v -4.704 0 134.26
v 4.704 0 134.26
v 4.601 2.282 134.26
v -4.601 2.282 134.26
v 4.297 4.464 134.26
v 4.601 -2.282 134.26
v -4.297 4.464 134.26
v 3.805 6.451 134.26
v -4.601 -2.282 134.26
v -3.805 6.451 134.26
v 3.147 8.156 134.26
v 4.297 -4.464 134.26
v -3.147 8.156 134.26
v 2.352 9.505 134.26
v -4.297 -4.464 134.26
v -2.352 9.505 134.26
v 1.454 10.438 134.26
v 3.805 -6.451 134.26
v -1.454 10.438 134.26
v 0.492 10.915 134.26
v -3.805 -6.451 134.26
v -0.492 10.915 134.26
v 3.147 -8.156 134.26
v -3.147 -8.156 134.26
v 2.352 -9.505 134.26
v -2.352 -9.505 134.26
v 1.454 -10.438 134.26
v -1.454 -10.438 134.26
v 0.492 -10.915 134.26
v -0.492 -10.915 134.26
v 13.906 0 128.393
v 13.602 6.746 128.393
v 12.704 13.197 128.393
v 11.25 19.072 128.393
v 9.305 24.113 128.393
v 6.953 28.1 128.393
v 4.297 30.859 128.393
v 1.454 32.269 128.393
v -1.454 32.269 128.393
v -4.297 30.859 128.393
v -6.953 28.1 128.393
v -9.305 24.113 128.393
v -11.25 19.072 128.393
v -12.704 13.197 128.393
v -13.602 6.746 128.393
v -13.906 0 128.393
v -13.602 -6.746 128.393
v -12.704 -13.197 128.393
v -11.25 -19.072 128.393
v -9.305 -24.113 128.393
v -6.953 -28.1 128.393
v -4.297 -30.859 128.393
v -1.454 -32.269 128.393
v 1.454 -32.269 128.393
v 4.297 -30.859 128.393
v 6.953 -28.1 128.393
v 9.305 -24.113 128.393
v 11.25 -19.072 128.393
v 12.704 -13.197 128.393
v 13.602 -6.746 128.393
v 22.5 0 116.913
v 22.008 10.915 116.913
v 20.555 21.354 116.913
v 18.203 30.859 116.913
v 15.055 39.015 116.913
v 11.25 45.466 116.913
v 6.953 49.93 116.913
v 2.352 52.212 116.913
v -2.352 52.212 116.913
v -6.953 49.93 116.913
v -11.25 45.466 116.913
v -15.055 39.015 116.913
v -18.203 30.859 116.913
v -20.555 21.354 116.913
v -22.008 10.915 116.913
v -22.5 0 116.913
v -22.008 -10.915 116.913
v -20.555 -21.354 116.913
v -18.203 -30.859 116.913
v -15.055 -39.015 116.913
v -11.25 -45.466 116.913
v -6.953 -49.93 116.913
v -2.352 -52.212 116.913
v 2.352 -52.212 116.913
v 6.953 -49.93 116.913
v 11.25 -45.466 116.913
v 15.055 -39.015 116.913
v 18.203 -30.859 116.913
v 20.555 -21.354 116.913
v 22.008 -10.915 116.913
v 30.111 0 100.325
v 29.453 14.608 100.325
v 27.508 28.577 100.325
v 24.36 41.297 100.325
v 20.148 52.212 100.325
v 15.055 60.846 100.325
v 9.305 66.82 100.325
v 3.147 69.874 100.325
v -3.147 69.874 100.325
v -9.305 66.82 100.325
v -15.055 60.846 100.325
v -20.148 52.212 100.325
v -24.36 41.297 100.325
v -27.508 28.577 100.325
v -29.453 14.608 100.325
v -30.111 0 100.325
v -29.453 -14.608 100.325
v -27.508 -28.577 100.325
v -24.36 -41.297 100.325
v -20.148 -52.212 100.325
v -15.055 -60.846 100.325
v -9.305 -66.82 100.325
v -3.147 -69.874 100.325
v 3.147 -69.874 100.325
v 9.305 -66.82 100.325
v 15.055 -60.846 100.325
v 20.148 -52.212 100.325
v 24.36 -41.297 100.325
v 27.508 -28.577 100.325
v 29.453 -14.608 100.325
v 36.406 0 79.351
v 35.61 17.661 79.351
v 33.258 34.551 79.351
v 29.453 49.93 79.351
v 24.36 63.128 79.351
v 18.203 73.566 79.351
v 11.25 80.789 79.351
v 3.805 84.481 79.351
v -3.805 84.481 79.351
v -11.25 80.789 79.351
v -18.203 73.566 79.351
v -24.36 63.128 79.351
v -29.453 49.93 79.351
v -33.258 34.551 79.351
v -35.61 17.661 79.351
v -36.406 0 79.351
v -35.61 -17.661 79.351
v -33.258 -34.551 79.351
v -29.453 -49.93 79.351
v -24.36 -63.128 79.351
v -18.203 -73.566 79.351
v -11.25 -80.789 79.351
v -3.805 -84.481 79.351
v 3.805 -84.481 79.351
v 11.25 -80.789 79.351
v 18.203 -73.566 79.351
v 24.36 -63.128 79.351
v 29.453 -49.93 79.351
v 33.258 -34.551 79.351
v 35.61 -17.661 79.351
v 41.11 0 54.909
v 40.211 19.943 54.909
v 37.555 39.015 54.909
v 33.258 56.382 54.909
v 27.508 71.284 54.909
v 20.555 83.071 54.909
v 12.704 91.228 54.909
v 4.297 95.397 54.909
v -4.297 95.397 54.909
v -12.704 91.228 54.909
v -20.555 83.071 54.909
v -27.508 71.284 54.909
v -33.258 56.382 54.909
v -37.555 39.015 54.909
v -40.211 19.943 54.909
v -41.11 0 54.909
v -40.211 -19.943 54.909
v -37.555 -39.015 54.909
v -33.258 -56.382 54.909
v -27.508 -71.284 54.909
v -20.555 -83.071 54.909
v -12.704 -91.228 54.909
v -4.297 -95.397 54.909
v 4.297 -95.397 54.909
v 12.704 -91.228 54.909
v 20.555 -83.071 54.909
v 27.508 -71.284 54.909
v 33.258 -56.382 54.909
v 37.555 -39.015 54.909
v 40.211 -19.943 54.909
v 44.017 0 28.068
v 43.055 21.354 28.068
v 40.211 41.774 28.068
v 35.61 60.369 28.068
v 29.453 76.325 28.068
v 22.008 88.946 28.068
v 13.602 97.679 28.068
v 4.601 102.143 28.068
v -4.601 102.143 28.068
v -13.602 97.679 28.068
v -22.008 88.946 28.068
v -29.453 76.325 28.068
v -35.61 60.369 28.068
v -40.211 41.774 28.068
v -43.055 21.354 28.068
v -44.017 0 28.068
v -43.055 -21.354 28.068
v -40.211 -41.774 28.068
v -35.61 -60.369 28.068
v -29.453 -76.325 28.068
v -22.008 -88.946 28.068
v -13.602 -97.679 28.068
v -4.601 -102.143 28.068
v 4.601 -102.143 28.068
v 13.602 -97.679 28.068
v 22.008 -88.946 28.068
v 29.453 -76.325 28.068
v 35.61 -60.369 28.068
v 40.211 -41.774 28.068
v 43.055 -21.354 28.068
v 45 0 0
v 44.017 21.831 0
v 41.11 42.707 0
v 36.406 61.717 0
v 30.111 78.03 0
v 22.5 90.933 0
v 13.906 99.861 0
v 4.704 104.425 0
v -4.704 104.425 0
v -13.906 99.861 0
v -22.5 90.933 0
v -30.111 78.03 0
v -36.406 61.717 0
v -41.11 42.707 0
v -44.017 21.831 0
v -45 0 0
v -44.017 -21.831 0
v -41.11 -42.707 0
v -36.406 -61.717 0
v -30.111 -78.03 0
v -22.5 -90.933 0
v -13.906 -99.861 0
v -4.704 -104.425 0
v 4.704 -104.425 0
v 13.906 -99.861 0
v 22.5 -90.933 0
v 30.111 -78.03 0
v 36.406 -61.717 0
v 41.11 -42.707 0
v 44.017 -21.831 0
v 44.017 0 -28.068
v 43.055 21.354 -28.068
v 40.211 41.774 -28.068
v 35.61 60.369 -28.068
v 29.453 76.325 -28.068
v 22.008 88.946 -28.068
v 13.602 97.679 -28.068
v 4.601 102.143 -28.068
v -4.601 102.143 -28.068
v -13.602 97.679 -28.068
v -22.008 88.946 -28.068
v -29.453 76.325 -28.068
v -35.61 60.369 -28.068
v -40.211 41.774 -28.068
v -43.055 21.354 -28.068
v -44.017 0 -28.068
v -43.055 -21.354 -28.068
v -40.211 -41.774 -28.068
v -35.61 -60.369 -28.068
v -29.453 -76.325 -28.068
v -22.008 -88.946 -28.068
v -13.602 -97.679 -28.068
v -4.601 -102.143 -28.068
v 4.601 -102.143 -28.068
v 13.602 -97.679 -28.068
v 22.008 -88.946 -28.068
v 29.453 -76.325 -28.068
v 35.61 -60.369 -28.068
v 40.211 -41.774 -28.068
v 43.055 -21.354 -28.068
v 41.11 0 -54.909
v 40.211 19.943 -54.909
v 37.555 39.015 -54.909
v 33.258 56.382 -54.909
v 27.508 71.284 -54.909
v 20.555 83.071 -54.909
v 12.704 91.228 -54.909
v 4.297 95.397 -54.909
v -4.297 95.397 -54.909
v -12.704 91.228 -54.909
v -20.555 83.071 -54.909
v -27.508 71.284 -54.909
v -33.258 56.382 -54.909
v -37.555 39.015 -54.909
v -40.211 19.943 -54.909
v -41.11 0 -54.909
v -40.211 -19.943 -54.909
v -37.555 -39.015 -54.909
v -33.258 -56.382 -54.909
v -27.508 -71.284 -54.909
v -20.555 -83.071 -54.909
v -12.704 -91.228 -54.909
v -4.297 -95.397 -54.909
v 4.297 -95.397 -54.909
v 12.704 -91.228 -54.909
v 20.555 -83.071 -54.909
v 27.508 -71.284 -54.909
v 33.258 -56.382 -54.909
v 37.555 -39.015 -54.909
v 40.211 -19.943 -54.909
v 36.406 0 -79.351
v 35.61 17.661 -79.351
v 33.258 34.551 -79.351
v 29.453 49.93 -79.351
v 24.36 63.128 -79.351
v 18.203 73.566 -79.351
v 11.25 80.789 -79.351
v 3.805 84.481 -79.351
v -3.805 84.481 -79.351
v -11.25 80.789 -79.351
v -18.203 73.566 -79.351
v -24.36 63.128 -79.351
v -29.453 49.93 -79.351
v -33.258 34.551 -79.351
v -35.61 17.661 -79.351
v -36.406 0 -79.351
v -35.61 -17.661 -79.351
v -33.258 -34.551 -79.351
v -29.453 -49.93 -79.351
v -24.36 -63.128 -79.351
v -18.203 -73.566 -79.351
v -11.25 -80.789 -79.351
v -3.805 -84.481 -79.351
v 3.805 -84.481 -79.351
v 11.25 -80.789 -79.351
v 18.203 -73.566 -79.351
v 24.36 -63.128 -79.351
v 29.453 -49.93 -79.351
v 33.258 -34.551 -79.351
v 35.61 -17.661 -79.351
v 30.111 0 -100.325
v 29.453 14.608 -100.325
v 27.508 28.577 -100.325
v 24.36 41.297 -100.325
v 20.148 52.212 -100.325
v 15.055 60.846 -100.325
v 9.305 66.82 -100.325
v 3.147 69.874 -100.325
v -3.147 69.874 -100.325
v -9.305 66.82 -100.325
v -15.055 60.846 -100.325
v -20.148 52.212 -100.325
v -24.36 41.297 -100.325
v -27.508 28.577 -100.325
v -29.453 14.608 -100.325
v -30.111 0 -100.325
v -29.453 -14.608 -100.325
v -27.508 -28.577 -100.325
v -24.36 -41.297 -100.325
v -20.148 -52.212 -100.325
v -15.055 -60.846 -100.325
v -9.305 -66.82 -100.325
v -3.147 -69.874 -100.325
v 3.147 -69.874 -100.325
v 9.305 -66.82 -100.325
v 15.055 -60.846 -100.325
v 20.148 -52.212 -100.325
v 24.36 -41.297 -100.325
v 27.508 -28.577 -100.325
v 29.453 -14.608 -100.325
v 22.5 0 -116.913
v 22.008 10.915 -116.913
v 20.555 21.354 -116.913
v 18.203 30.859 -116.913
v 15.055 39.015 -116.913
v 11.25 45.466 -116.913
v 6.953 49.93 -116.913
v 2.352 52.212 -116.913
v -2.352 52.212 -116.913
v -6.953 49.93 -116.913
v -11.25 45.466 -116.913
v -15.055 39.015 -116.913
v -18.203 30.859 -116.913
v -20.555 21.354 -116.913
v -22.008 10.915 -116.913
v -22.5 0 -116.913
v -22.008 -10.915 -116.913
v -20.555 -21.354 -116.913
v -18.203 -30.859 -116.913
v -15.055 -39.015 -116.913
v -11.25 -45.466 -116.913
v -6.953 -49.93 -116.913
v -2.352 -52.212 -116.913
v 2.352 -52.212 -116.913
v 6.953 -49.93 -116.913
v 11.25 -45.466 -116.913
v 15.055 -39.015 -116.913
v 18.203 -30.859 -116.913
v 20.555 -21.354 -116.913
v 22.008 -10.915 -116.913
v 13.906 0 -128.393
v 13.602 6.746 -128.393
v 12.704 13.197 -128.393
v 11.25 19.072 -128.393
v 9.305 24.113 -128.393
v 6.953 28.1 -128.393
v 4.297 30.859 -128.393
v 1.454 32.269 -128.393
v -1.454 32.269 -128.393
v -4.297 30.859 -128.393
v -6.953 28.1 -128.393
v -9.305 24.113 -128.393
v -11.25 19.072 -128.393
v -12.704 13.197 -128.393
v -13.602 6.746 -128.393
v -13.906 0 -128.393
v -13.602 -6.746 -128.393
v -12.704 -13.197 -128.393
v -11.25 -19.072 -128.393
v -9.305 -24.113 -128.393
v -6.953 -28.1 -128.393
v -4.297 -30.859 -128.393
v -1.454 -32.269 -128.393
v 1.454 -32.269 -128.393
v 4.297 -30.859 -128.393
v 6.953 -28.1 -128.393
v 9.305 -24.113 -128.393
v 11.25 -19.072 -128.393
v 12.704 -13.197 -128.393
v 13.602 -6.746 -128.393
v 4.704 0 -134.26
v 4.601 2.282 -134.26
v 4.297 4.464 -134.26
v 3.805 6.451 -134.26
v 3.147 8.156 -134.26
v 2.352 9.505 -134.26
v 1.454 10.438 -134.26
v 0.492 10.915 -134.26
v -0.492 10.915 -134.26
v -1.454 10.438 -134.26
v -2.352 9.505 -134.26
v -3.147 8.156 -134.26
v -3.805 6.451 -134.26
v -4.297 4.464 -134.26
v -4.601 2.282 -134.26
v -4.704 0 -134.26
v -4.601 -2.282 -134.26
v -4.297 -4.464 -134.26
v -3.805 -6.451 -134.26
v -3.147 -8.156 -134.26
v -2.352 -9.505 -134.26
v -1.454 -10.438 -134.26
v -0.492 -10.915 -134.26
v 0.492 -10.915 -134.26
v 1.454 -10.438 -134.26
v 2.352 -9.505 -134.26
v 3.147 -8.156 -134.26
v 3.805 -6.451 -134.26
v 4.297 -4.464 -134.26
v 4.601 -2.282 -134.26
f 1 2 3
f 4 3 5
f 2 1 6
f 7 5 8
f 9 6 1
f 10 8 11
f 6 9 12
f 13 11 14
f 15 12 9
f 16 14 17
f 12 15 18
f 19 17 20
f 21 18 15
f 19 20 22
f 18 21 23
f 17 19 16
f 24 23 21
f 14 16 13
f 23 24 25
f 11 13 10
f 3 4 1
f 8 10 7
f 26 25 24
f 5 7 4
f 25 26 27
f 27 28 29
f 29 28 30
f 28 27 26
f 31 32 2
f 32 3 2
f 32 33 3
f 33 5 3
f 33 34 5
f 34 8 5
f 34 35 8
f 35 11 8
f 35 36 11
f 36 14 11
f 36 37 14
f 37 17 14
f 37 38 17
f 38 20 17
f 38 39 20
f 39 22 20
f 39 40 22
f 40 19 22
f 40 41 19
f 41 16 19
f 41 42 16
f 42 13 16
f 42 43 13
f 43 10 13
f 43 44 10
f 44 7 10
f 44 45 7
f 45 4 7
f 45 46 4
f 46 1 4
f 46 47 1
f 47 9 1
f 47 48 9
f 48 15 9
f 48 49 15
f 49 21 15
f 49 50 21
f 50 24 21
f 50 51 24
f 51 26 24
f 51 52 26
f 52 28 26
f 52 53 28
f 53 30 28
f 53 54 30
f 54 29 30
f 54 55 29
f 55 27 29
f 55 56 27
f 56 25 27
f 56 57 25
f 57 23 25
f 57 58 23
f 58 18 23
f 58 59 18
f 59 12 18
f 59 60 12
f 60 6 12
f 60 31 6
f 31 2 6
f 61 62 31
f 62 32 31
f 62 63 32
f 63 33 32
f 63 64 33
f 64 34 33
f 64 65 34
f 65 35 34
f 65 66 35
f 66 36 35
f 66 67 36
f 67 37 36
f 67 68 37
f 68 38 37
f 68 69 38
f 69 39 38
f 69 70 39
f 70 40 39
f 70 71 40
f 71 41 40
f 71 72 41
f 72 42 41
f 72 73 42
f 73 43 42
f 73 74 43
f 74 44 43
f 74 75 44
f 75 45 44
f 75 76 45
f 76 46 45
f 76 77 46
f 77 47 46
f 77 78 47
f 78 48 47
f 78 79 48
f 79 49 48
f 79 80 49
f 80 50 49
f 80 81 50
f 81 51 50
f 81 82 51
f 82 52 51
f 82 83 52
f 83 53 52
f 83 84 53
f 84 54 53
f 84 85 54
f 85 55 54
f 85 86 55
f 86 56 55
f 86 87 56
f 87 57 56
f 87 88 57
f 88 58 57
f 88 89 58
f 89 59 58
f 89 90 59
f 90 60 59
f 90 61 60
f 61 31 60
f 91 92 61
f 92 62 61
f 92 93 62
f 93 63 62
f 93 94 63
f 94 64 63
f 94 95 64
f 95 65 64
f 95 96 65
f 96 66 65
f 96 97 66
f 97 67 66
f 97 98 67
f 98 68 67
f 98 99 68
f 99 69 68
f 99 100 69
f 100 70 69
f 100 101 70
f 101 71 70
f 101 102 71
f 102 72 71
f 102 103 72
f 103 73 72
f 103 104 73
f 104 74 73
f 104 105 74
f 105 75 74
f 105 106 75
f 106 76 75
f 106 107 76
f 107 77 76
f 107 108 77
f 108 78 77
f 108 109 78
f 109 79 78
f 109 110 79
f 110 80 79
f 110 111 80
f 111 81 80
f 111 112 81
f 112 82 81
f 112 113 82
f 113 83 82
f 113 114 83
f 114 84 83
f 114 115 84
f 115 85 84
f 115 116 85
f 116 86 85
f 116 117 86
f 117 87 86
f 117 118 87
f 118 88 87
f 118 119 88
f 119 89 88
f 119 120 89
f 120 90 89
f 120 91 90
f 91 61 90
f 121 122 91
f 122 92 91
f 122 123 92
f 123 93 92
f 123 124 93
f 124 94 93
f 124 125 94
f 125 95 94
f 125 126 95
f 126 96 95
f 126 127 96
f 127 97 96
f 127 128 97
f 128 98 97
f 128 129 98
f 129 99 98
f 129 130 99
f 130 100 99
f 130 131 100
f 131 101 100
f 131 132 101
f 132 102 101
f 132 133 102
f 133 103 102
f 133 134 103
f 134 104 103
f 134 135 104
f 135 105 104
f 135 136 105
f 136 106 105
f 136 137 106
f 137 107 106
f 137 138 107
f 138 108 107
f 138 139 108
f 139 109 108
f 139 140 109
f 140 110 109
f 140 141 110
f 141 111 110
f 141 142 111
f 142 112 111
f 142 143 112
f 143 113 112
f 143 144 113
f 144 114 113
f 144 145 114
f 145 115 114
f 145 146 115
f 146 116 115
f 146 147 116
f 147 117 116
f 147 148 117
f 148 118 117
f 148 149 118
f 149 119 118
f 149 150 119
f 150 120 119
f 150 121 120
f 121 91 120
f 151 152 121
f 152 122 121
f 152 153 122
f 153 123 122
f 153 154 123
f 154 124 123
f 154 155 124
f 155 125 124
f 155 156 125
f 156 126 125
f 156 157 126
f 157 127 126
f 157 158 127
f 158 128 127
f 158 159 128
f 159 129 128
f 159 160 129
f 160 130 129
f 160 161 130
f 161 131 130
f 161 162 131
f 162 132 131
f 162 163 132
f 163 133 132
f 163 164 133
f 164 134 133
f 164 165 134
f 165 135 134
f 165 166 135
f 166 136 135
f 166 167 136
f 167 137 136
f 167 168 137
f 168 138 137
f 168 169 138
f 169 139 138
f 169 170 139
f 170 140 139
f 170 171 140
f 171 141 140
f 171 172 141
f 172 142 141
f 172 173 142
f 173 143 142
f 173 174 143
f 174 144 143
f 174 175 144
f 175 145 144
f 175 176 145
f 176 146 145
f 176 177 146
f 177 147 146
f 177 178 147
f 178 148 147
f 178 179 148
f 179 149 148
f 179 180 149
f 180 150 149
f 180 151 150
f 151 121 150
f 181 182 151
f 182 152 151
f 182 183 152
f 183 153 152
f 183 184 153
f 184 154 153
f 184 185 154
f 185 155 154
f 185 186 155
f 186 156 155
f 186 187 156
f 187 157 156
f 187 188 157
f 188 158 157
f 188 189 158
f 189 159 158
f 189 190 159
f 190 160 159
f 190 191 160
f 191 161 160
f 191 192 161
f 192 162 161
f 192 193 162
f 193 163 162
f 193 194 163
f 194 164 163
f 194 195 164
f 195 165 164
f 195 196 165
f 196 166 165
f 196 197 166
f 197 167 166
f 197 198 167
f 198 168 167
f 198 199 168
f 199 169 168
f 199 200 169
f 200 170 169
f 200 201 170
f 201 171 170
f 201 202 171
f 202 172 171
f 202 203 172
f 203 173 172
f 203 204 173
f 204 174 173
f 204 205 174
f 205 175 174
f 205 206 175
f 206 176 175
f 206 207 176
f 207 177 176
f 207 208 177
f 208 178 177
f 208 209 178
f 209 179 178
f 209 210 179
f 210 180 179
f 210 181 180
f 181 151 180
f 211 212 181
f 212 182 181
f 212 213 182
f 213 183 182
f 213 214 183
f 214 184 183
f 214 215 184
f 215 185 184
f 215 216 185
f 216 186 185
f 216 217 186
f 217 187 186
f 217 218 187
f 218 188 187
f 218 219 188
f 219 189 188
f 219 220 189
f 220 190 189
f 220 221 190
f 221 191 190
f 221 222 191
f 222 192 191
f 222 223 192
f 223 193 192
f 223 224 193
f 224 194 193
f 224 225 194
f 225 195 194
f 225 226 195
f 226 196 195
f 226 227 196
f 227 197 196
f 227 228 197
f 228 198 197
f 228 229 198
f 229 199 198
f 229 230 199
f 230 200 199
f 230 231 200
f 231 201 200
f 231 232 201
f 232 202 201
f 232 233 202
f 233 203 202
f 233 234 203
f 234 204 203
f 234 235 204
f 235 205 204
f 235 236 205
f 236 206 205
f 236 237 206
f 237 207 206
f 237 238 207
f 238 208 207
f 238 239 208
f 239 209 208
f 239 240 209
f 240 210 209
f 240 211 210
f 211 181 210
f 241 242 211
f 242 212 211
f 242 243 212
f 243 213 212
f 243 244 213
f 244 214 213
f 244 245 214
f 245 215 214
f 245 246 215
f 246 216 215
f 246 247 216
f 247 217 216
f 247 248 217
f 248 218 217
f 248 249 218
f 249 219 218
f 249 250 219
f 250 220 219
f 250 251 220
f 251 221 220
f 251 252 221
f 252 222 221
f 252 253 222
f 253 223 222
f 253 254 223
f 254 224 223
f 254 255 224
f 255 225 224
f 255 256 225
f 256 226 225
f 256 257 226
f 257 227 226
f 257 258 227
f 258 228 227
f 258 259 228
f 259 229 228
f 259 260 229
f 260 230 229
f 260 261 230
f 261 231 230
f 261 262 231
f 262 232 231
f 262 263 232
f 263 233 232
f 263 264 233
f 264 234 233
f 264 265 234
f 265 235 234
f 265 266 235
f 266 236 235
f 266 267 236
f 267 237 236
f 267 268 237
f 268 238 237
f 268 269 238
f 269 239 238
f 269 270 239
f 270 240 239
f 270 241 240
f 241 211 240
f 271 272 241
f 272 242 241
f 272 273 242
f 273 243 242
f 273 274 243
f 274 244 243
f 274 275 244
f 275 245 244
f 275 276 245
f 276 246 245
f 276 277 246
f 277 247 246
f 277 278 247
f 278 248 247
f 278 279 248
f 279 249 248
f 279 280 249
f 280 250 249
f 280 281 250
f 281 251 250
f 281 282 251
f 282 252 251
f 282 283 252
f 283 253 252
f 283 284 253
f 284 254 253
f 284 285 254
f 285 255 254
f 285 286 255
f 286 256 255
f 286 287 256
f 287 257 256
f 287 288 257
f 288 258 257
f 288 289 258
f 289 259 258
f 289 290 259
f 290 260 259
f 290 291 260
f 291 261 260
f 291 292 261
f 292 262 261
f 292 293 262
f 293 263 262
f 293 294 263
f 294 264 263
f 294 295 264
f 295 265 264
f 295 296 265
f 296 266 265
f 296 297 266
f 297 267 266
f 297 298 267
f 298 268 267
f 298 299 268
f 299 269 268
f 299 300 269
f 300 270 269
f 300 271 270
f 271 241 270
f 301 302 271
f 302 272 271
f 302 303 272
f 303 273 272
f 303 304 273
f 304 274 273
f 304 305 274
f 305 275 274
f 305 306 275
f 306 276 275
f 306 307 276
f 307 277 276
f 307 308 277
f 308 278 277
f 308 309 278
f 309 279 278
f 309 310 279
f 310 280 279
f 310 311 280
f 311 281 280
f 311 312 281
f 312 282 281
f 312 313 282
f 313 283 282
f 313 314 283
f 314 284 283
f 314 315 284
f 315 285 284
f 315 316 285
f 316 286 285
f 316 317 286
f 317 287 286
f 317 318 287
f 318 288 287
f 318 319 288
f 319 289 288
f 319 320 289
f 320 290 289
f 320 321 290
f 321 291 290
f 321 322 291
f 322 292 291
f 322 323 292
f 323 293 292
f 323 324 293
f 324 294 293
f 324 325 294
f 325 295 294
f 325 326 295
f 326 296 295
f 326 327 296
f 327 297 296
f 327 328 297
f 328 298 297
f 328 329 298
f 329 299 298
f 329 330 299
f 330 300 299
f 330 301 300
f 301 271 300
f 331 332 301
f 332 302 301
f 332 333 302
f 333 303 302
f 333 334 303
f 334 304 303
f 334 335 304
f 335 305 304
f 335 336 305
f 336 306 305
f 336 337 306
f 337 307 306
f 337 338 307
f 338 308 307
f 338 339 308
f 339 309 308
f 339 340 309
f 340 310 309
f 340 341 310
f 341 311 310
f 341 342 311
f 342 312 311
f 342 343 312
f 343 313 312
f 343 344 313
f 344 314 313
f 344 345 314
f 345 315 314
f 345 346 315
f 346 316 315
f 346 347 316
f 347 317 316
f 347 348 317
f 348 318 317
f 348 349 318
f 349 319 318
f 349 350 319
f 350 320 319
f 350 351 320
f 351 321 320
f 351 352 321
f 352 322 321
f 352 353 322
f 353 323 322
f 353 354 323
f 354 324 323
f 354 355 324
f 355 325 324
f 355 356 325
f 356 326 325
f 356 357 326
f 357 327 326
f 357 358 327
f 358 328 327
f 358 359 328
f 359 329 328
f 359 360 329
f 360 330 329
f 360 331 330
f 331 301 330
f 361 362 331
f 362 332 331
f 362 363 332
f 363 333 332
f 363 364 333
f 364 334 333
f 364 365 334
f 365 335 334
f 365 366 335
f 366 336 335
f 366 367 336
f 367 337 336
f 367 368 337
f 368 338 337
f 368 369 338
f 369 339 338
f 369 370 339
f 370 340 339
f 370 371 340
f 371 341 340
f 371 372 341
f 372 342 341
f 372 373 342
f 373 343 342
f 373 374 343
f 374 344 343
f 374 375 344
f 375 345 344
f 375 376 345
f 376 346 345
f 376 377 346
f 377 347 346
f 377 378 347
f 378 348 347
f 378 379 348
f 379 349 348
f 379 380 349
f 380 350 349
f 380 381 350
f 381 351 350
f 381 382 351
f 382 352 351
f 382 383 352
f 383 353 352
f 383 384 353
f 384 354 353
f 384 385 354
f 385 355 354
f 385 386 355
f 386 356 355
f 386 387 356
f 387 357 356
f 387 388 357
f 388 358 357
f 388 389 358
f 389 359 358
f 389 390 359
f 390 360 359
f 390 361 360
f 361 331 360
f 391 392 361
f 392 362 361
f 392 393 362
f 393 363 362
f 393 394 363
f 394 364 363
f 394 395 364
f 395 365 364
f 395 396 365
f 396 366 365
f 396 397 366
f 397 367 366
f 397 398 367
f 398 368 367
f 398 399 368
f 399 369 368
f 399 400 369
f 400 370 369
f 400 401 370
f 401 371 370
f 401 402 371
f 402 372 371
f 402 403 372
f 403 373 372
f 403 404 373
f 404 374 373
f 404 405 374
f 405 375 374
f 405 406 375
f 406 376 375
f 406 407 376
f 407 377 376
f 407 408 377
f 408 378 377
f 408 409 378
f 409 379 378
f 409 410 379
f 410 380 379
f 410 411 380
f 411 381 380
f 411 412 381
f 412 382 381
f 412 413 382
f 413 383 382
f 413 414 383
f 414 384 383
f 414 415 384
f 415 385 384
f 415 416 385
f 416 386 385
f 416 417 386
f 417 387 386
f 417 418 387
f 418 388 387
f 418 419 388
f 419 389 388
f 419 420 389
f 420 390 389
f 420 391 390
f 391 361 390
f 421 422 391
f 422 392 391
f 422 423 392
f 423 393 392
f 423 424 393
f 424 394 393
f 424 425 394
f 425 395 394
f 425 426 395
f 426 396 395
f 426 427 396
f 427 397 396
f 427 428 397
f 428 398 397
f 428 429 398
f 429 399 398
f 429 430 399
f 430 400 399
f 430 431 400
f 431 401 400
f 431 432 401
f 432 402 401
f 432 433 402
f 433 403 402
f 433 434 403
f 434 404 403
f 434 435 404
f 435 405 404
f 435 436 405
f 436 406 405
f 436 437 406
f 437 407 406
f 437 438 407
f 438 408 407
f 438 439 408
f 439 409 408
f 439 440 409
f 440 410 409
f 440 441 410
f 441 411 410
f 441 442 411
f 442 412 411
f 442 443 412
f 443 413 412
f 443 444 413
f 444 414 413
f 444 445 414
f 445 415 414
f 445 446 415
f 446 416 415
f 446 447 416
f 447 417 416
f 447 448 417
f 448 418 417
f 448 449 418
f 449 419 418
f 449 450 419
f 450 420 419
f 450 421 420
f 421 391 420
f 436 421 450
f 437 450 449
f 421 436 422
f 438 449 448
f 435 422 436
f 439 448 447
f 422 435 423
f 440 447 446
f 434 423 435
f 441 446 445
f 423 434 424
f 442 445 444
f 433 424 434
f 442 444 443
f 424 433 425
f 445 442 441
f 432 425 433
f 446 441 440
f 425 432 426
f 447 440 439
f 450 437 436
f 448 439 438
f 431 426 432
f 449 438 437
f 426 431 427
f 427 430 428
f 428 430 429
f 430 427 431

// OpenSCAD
// Generated by SolidPython 1.0.1 on 2020-07-29 00:39:25


scale(v = [3, 7, 9]) {
	sphere(r = 15);
}
/***********************************************
*********      SolidPython code:      **********
************************************************
 
# import packages: SolidPython
from solid import *
from solid.utils import *
from itertools import chain, combinations


class Resize:

    def __init__(self, scad_file):
        self.scad_file = scad_file
        #self.scad_file = import_scad(scad_file)
        # cone/cylinder param:
        self.r1 = 0
        self.r2 = 0
        self.h = 0
        # rectangular prism param:
        self.w = 0
        self.l = 0
        # ellipse param:
        self.r = 0

    # import OpenScad code (file name corresponds to shape)


    # classify shape + parameters
    def assign(self, param1, param2, param3):
        if self.scad_file == 'cone.scad':
            self.r1 = param1
            self.r2 = param2
            self.h = param3
        elif self.scad_file == 'cylinder.scad':
            self.r1 = param1
            self.r2 = param2
            self.h = param3
        elif self.scad_file == 'rectangularPrism.scad':
            self.h = param1
            self.l = param2
            self.w = param3
        else:
            self.r = param1
            self.h = param2

    # resize parameters
    def iterate(self):
        x = range(3, 20, 2)
        i = 1
        if self.scad_file == 'cone.scad':
            tempList = list(combinations(x, 2))
            for temp in tempList:
                param1 = temp[0]
                param2 = temp[1]
                filepath = 'produced_scad_files/' + 'cone' + str(param1) + '_' + str(param2) + '_' + '.scad'
                scad_render_to_file(cylinder(h=param1, r1=param2, r2=0), filepath)

        elif self.scad_file == 'cylinder.scad':
            tempList = list(combinations(x, 3))
            for temp in tempList:
                param1 = temp[0]
                param2 = temp[1]
                filepath = 'produced_scad_files/' + 'cylinder' + str(param1) + '_' + str(param2) + '_' + '.scad'
                scad_render_to_file(cylinder(h=param1, r1=param2, r2=param2), filepath)

        elif self.scad_file == 'rectangularPrism.scad':
            tempList = list(combinations(x, 3))
            for temp in tempList:
                param1 = temp[0]
                param2 = temp[1]
                param3 = temp[2]
                filepath = 'produced_scad_files/' + 'rectangularPrism' + str(param1) + '_' + str(param2) + '_' + str(
                    param3) + '.scad'
                scad_render_to_file(cube(size=(param1, param2, param3)), filepath)

        elif self.scad_file == 'ellipse.scad':
            tempList = list(combinations(x, 4))
            for temp in tempList:
                param1 = temp[0]
                param2 = temp[1]
                param3 = temp[2]
                param4 = temp[3]
                filepath = 'produced_scad_files/' + 'ellipse' + str(param1) + '_' + str(param2) + '_' + str(param3) + '_' + str(param4) + '.scad'
                scad_render_to_file(scale([param1, param2, param3])(sphere(r=param4)), filepath)

    def render_to_scadfile(self):
        scad_render_to_file(scad, 'example.scad') 
 
************************************************/
